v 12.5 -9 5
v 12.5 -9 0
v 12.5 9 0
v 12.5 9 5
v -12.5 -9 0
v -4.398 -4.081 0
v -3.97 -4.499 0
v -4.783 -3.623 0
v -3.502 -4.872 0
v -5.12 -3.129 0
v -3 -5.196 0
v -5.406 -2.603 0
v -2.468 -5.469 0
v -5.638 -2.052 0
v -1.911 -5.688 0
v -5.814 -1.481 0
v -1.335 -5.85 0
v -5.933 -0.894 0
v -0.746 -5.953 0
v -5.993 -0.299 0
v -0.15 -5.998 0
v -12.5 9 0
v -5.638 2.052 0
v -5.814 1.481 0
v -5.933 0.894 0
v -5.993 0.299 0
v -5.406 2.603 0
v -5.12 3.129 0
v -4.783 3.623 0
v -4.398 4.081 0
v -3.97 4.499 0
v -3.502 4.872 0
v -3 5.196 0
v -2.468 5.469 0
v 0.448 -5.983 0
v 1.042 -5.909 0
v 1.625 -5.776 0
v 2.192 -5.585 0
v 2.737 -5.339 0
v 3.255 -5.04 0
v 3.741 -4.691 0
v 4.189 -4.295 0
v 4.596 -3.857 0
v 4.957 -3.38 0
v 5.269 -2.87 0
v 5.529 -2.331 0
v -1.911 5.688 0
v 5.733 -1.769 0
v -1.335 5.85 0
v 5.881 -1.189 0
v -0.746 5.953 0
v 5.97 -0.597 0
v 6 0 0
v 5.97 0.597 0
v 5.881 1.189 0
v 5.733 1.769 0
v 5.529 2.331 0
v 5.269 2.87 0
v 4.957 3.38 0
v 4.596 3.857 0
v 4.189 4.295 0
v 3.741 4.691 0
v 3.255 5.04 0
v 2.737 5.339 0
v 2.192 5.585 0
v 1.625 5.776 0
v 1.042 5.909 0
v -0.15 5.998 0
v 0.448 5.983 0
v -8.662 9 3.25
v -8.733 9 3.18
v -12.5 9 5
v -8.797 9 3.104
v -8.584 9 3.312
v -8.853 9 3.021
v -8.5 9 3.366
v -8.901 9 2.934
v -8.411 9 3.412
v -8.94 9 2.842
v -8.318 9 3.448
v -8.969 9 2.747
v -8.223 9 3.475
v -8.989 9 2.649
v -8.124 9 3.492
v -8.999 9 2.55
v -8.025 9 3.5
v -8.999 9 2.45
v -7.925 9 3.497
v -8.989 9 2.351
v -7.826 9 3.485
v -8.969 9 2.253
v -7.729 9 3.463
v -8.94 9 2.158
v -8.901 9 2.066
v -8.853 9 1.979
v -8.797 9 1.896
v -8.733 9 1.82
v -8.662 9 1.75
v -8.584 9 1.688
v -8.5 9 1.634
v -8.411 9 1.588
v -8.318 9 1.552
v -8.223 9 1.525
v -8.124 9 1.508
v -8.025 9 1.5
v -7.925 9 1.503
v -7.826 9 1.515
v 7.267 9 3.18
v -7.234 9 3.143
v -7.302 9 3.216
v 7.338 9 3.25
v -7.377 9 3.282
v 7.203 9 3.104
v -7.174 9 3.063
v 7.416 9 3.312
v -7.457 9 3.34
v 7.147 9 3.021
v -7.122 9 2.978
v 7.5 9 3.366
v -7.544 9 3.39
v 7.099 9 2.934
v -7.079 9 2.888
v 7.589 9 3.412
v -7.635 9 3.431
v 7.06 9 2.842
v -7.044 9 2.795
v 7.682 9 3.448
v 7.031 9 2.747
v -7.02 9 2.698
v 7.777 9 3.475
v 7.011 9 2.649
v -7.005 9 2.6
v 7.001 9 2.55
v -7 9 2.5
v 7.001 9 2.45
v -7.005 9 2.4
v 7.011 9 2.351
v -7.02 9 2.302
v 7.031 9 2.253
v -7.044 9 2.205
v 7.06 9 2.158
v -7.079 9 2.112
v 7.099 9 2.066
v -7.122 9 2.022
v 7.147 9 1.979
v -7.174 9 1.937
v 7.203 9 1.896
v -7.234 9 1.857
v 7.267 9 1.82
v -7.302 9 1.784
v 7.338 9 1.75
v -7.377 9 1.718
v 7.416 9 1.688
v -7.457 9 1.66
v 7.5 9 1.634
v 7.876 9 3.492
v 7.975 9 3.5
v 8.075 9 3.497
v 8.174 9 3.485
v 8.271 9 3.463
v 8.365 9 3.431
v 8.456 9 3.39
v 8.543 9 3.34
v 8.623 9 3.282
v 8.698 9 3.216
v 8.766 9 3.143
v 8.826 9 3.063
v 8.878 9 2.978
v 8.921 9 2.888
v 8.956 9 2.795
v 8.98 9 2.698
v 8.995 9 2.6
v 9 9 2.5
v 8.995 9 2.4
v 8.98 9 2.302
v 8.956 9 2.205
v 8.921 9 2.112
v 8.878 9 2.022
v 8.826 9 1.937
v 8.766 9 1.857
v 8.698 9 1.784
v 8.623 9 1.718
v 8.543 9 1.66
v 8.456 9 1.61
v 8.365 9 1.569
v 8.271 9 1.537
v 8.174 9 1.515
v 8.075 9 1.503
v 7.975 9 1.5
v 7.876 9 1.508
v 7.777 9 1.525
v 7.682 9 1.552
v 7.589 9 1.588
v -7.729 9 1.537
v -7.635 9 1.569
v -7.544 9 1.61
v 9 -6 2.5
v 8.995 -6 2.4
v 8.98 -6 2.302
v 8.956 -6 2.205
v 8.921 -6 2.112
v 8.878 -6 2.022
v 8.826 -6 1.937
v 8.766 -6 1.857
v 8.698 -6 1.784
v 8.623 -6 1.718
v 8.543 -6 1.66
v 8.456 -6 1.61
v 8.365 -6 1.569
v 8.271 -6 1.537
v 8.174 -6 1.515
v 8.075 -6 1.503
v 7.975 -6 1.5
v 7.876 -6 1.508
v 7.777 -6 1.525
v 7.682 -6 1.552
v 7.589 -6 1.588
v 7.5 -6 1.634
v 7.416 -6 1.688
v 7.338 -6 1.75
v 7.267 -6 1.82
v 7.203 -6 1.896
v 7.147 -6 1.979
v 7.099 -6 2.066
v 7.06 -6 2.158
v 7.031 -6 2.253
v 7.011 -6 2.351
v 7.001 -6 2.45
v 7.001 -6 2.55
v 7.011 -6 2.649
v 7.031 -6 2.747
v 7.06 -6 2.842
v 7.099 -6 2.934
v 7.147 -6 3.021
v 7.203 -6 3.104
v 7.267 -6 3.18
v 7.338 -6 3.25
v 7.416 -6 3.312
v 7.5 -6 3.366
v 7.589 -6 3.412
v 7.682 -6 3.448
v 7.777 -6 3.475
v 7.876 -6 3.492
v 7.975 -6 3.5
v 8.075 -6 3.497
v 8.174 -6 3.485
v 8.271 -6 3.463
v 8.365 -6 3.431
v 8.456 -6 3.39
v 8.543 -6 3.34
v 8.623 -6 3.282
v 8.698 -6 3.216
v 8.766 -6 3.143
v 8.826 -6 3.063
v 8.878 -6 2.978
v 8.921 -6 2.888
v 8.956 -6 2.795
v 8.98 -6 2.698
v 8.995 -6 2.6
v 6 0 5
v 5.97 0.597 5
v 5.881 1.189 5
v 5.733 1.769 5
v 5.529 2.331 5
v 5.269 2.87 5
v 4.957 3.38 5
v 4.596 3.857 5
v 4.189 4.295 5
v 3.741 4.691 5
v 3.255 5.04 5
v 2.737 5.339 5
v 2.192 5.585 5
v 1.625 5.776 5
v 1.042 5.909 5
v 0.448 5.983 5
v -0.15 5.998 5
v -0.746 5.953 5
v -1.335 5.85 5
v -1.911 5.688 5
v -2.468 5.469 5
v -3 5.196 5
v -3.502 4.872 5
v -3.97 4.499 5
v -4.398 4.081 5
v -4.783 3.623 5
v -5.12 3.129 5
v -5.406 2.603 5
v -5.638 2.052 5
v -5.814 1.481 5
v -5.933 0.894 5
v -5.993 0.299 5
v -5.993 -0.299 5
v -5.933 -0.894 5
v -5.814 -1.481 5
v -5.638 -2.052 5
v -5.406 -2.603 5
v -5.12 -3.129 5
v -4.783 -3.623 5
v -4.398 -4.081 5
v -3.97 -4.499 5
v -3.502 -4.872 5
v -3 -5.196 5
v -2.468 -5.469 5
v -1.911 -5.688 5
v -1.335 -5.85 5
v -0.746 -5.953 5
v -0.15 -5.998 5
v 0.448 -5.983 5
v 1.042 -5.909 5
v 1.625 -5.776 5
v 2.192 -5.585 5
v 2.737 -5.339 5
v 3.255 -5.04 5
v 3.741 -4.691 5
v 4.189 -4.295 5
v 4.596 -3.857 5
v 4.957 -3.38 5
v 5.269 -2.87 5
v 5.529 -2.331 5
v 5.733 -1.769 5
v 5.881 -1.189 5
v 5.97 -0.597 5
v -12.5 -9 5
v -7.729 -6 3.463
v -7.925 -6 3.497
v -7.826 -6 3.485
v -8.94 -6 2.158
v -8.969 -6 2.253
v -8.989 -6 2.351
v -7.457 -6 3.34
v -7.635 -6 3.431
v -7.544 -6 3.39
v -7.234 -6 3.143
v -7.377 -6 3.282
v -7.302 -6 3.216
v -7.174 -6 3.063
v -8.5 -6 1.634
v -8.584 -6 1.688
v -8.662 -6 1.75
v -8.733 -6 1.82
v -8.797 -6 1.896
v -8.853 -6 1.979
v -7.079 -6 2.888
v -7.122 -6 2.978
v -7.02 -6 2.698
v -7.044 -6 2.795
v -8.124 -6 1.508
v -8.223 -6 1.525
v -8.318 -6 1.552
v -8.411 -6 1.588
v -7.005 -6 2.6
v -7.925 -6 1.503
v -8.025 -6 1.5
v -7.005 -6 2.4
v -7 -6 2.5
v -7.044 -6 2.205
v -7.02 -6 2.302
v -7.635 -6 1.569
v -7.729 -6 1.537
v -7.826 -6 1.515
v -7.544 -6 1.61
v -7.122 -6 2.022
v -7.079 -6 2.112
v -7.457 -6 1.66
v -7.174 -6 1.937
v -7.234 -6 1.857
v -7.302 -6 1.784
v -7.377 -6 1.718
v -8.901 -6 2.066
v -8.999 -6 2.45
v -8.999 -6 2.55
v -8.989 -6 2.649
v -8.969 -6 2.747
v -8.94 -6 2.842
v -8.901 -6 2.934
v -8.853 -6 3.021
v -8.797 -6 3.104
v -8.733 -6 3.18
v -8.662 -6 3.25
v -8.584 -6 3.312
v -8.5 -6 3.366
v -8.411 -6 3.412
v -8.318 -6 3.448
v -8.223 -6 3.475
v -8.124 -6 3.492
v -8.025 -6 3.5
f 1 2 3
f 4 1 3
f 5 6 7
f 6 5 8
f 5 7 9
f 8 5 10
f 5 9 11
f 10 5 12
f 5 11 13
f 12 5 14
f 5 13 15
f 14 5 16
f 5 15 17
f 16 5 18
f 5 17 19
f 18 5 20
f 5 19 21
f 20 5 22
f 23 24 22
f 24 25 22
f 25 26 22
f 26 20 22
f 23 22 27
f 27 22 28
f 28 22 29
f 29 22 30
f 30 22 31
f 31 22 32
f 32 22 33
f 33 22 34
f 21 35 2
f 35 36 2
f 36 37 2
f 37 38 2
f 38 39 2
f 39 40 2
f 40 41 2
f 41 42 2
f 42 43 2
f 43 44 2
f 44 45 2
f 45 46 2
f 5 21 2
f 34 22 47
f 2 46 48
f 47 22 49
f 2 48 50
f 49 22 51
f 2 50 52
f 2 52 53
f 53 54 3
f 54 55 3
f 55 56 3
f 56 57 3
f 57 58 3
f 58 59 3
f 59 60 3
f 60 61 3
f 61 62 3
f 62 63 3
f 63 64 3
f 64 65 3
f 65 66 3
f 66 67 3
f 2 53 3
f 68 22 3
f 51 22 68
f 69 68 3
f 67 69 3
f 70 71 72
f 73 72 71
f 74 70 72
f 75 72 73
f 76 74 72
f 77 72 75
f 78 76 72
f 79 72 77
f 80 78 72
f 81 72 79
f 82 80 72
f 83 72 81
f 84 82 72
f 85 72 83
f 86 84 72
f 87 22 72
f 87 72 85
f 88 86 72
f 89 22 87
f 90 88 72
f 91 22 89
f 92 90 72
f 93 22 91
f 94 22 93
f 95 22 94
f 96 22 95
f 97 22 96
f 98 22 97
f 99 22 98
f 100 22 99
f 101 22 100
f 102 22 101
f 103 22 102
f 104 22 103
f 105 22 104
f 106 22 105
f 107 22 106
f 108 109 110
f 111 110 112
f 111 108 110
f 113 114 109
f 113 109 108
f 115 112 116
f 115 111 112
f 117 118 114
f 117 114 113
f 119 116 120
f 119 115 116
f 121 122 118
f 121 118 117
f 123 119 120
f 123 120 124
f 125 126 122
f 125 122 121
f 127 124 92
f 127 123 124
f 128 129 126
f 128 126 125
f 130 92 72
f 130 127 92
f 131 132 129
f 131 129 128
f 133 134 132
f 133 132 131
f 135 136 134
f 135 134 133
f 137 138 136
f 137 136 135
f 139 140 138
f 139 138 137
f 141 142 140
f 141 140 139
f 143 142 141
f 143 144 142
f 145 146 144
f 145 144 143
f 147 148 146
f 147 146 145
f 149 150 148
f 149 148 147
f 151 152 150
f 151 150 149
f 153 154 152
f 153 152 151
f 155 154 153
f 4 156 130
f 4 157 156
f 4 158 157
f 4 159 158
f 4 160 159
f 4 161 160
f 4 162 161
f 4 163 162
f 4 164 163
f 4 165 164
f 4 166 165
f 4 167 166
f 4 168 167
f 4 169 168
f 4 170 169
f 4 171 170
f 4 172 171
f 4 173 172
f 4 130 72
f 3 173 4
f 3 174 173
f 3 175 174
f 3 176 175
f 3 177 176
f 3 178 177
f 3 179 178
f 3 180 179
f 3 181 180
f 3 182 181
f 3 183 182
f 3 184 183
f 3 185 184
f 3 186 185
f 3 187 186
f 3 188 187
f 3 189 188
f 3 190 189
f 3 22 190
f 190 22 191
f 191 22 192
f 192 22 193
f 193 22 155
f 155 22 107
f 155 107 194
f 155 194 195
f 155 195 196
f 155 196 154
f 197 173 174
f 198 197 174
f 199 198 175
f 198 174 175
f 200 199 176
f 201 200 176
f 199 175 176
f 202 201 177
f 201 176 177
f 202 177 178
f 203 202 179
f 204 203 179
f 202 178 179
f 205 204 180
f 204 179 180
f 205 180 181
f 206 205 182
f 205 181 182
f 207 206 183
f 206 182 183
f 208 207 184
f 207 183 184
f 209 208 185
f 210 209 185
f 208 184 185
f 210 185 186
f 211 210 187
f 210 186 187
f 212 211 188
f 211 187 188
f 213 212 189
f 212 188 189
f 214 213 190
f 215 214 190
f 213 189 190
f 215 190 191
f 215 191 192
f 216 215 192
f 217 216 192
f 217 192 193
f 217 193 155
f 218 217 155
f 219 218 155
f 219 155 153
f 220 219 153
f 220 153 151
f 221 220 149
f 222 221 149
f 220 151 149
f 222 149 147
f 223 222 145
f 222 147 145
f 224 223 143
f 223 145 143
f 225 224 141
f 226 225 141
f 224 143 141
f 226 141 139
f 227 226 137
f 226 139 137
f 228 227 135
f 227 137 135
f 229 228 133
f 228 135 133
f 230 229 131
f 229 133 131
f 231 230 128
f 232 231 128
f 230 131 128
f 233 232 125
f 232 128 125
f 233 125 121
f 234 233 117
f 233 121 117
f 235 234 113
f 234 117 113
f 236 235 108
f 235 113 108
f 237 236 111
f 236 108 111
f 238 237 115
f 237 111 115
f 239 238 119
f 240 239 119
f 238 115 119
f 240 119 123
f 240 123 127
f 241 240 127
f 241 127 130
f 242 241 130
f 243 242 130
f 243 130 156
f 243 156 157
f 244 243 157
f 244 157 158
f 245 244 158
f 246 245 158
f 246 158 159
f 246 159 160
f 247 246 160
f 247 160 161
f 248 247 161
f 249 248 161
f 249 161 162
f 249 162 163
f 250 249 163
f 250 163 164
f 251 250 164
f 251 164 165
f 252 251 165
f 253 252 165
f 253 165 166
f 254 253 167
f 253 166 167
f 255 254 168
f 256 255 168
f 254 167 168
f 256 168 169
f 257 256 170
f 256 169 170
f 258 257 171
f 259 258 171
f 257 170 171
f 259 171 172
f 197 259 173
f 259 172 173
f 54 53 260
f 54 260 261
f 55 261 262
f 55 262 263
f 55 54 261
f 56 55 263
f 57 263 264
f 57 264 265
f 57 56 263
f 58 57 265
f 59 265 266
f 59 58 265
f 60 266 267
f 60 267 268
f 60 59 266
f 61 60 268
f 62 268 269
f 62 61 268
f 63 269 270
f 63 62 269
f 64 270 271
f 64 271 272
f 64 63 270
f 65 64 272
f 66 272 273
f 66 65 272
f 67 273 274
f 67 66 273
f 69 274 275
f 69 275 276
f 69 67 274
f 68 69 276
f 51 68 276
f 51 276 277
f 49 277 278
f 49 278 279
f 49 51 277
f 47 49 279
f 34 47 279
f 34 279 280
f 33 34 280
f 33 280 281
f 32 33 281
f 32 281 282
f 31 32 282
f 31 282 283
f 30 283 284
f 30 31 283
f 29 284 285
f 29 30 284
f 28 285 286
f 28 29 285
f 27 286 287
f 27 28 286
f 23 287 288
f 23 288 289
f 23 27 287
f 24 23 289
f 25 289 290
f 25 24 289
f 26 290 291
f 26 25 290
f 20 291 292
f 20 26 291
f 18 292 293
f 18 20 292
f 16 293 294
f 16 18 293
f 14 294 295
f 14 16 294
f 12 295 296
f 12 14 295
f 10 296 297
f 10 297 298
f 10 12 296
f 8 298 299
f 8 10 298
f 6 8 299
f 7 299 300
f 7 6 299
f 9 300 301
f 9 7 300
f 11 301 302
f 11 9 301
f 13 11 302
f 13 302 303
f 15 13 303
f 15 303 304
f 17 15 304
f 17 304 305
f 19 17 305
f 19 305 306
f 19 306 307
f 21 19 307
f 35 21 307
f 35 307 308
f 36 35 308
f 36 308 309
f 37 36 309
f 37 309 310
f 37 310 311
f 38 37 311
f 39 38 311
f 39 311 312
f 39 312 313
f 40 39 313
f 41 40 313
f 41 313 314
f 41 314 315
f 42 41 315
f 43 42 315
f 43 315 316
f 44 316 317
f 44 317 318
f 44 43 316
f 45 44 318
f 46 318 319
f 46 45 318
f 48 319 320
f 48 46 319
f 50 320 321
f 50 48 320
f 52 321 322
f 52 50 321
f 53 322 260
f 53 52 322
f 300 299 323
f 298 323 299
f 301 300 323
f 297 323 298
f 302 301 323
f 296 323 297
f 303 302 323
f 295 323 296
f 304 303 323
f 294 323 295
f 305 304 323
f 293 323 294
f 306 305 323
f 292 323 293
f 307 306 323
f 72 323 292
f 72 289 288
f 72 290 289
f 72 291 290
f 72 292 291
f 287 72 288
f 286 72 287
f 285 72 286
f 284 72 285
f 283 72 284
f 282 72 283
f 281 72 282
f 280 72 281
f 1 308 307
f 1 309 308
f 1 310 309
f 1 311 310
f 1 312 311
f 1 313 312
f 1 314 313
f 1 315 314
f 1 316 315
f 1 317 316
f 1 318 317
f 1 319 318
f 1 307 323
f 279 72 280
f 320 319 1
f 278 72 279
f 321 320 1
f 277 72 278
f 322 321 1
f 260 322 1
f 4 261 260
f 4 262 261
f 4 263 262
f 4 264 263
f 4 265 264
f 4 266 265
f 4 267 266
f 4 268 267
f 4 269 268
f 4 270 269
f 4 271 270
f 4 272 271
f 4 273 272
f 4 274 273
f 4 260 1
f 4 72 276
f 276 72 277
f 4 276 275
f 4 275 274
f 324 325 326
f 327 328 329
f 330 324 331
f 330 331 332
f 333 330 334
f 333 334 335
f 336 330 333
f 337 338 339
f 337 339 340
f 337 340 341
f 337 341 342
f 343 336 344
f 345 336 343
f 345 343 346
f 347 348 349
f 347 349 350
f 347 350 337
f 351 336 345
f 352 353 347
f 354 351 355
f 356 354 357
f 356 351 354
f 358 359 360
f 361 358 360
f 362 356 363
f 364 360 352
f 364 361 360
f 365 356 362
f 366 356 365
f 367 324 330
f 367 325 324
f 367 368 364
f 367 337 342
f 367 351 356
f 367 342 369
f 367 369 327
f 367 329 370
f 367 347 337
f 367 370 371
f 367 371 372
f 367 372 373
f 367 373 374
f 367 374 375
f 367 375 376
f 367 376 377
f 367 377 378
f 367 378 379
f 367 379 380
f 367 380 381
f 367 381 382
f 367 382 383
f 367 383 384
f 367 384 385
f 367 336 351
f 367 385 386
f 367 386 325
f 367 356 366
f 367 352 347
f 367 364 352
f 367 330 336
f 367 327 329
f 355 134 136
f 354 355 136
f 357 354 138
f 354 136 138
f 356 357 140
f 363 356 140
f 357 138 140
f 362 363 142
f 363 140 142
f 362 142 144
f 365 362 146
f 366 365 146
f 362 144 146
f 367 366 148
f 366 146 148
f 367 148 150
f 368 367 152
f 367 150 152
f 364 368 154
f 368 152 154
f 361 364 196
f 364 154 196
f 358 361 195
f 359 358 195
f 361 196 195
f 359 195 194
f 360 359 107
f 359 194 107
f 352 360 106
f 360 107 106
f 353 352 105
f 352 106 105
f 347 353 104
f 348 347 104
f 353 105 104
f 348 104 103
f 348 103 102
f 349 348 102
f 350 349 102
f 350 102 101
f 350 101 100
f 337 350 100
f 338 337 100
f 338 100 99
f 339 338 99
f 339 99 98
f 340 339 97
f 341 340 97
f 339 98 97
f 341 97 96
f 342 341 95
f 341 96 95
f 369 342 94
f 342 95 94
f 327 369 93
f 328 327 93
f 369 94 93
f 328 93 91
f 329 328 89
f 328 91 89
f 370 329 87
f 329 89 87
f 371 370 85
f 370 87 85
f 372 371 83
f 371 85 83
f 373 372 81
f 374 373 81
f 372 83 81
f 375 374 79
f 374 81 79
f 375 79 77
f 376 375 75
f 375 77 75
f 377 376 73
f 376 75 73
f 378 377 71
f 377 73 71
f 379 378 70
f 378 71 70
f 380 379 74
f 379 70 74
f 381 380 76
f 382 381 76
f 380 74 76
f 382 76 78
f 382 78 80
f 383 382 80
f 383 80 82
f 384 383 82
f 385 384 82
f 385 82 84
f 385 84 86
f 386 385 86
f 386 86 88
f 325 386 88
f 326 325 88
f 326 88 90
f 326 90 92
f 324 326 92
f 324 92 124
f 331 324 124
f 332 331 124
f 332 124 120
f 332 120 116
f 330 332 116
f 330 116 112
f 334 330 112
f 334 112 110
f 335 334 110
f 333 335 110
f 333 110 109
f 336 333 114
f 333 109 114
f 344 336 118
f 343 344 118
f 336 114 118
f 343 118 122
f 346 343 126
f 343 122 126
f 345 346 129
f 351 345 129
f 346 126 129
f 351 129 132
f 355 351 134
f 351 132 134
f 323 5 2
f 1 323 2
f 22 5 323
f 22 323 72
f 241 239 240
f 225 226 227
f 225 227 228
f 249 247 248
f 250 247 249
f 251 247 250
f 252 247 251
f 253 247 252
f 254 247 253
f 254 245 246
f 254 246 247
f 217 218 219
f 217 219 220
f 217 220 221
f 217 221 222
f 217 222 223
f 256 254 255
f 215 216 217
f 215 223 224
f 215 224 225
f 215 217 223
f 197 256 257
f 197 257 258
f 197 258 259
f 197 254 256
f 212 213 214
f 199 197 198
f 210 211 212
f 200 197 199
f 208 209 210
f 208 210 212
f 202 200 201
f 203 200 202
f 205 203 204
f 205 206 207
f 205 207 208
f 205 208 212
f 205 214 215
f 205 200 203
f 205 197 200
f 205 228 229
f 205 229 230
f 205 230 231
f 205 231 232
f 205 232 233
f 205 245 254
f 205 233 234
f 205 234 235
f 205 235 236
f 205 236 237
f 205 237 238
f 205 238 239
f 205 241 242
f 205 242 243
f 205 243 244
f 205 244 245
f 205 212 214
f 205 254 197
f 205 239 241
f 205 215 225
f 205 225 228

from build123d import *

# Parameters (mm, degrees)
ESQUISSE1_W             = 25
ESQUISSE1_H             = 18
ESQUISSE1_R             = 6
BOSS_EXTRU_1_DEPTH      = 5
ESQUISSE2_R             = 1
ENL_V_MAT_EXTRU_1_DEPTH = 15


with BuildPart() as part:
    # Esquisse1 → Boss.-Extru.1 (new body)
    with BuildSketch(Plane.XY):
        Rectangle(ESQUISSE1_W, ESQUISSE1_H)
        Circle(ESQUISSE1_R, mode=Mode.SUBTRACT)
    extrude(amount=BOSS_EXTRU_1_DEPTH)

    # Esquisse2 → Enlèv. mat.-Extru.1 (cut)
    with BuildSketch(Plane(origin=(0, 9, 0), x_dir=(1, 0, 0), z_dir=(0, 1, 0))):
        with Locations((-8, -2.5)):
            Circle(ESQUISSE2_R)
        with Locations((8, -2.5)):
            Circle(ESQUISSE2_R)
    extrude(amount=-ENL_V_MAT_EXTRU_1_DEPTH, mode=Mode.SUBTRACT)


solid = part.part
